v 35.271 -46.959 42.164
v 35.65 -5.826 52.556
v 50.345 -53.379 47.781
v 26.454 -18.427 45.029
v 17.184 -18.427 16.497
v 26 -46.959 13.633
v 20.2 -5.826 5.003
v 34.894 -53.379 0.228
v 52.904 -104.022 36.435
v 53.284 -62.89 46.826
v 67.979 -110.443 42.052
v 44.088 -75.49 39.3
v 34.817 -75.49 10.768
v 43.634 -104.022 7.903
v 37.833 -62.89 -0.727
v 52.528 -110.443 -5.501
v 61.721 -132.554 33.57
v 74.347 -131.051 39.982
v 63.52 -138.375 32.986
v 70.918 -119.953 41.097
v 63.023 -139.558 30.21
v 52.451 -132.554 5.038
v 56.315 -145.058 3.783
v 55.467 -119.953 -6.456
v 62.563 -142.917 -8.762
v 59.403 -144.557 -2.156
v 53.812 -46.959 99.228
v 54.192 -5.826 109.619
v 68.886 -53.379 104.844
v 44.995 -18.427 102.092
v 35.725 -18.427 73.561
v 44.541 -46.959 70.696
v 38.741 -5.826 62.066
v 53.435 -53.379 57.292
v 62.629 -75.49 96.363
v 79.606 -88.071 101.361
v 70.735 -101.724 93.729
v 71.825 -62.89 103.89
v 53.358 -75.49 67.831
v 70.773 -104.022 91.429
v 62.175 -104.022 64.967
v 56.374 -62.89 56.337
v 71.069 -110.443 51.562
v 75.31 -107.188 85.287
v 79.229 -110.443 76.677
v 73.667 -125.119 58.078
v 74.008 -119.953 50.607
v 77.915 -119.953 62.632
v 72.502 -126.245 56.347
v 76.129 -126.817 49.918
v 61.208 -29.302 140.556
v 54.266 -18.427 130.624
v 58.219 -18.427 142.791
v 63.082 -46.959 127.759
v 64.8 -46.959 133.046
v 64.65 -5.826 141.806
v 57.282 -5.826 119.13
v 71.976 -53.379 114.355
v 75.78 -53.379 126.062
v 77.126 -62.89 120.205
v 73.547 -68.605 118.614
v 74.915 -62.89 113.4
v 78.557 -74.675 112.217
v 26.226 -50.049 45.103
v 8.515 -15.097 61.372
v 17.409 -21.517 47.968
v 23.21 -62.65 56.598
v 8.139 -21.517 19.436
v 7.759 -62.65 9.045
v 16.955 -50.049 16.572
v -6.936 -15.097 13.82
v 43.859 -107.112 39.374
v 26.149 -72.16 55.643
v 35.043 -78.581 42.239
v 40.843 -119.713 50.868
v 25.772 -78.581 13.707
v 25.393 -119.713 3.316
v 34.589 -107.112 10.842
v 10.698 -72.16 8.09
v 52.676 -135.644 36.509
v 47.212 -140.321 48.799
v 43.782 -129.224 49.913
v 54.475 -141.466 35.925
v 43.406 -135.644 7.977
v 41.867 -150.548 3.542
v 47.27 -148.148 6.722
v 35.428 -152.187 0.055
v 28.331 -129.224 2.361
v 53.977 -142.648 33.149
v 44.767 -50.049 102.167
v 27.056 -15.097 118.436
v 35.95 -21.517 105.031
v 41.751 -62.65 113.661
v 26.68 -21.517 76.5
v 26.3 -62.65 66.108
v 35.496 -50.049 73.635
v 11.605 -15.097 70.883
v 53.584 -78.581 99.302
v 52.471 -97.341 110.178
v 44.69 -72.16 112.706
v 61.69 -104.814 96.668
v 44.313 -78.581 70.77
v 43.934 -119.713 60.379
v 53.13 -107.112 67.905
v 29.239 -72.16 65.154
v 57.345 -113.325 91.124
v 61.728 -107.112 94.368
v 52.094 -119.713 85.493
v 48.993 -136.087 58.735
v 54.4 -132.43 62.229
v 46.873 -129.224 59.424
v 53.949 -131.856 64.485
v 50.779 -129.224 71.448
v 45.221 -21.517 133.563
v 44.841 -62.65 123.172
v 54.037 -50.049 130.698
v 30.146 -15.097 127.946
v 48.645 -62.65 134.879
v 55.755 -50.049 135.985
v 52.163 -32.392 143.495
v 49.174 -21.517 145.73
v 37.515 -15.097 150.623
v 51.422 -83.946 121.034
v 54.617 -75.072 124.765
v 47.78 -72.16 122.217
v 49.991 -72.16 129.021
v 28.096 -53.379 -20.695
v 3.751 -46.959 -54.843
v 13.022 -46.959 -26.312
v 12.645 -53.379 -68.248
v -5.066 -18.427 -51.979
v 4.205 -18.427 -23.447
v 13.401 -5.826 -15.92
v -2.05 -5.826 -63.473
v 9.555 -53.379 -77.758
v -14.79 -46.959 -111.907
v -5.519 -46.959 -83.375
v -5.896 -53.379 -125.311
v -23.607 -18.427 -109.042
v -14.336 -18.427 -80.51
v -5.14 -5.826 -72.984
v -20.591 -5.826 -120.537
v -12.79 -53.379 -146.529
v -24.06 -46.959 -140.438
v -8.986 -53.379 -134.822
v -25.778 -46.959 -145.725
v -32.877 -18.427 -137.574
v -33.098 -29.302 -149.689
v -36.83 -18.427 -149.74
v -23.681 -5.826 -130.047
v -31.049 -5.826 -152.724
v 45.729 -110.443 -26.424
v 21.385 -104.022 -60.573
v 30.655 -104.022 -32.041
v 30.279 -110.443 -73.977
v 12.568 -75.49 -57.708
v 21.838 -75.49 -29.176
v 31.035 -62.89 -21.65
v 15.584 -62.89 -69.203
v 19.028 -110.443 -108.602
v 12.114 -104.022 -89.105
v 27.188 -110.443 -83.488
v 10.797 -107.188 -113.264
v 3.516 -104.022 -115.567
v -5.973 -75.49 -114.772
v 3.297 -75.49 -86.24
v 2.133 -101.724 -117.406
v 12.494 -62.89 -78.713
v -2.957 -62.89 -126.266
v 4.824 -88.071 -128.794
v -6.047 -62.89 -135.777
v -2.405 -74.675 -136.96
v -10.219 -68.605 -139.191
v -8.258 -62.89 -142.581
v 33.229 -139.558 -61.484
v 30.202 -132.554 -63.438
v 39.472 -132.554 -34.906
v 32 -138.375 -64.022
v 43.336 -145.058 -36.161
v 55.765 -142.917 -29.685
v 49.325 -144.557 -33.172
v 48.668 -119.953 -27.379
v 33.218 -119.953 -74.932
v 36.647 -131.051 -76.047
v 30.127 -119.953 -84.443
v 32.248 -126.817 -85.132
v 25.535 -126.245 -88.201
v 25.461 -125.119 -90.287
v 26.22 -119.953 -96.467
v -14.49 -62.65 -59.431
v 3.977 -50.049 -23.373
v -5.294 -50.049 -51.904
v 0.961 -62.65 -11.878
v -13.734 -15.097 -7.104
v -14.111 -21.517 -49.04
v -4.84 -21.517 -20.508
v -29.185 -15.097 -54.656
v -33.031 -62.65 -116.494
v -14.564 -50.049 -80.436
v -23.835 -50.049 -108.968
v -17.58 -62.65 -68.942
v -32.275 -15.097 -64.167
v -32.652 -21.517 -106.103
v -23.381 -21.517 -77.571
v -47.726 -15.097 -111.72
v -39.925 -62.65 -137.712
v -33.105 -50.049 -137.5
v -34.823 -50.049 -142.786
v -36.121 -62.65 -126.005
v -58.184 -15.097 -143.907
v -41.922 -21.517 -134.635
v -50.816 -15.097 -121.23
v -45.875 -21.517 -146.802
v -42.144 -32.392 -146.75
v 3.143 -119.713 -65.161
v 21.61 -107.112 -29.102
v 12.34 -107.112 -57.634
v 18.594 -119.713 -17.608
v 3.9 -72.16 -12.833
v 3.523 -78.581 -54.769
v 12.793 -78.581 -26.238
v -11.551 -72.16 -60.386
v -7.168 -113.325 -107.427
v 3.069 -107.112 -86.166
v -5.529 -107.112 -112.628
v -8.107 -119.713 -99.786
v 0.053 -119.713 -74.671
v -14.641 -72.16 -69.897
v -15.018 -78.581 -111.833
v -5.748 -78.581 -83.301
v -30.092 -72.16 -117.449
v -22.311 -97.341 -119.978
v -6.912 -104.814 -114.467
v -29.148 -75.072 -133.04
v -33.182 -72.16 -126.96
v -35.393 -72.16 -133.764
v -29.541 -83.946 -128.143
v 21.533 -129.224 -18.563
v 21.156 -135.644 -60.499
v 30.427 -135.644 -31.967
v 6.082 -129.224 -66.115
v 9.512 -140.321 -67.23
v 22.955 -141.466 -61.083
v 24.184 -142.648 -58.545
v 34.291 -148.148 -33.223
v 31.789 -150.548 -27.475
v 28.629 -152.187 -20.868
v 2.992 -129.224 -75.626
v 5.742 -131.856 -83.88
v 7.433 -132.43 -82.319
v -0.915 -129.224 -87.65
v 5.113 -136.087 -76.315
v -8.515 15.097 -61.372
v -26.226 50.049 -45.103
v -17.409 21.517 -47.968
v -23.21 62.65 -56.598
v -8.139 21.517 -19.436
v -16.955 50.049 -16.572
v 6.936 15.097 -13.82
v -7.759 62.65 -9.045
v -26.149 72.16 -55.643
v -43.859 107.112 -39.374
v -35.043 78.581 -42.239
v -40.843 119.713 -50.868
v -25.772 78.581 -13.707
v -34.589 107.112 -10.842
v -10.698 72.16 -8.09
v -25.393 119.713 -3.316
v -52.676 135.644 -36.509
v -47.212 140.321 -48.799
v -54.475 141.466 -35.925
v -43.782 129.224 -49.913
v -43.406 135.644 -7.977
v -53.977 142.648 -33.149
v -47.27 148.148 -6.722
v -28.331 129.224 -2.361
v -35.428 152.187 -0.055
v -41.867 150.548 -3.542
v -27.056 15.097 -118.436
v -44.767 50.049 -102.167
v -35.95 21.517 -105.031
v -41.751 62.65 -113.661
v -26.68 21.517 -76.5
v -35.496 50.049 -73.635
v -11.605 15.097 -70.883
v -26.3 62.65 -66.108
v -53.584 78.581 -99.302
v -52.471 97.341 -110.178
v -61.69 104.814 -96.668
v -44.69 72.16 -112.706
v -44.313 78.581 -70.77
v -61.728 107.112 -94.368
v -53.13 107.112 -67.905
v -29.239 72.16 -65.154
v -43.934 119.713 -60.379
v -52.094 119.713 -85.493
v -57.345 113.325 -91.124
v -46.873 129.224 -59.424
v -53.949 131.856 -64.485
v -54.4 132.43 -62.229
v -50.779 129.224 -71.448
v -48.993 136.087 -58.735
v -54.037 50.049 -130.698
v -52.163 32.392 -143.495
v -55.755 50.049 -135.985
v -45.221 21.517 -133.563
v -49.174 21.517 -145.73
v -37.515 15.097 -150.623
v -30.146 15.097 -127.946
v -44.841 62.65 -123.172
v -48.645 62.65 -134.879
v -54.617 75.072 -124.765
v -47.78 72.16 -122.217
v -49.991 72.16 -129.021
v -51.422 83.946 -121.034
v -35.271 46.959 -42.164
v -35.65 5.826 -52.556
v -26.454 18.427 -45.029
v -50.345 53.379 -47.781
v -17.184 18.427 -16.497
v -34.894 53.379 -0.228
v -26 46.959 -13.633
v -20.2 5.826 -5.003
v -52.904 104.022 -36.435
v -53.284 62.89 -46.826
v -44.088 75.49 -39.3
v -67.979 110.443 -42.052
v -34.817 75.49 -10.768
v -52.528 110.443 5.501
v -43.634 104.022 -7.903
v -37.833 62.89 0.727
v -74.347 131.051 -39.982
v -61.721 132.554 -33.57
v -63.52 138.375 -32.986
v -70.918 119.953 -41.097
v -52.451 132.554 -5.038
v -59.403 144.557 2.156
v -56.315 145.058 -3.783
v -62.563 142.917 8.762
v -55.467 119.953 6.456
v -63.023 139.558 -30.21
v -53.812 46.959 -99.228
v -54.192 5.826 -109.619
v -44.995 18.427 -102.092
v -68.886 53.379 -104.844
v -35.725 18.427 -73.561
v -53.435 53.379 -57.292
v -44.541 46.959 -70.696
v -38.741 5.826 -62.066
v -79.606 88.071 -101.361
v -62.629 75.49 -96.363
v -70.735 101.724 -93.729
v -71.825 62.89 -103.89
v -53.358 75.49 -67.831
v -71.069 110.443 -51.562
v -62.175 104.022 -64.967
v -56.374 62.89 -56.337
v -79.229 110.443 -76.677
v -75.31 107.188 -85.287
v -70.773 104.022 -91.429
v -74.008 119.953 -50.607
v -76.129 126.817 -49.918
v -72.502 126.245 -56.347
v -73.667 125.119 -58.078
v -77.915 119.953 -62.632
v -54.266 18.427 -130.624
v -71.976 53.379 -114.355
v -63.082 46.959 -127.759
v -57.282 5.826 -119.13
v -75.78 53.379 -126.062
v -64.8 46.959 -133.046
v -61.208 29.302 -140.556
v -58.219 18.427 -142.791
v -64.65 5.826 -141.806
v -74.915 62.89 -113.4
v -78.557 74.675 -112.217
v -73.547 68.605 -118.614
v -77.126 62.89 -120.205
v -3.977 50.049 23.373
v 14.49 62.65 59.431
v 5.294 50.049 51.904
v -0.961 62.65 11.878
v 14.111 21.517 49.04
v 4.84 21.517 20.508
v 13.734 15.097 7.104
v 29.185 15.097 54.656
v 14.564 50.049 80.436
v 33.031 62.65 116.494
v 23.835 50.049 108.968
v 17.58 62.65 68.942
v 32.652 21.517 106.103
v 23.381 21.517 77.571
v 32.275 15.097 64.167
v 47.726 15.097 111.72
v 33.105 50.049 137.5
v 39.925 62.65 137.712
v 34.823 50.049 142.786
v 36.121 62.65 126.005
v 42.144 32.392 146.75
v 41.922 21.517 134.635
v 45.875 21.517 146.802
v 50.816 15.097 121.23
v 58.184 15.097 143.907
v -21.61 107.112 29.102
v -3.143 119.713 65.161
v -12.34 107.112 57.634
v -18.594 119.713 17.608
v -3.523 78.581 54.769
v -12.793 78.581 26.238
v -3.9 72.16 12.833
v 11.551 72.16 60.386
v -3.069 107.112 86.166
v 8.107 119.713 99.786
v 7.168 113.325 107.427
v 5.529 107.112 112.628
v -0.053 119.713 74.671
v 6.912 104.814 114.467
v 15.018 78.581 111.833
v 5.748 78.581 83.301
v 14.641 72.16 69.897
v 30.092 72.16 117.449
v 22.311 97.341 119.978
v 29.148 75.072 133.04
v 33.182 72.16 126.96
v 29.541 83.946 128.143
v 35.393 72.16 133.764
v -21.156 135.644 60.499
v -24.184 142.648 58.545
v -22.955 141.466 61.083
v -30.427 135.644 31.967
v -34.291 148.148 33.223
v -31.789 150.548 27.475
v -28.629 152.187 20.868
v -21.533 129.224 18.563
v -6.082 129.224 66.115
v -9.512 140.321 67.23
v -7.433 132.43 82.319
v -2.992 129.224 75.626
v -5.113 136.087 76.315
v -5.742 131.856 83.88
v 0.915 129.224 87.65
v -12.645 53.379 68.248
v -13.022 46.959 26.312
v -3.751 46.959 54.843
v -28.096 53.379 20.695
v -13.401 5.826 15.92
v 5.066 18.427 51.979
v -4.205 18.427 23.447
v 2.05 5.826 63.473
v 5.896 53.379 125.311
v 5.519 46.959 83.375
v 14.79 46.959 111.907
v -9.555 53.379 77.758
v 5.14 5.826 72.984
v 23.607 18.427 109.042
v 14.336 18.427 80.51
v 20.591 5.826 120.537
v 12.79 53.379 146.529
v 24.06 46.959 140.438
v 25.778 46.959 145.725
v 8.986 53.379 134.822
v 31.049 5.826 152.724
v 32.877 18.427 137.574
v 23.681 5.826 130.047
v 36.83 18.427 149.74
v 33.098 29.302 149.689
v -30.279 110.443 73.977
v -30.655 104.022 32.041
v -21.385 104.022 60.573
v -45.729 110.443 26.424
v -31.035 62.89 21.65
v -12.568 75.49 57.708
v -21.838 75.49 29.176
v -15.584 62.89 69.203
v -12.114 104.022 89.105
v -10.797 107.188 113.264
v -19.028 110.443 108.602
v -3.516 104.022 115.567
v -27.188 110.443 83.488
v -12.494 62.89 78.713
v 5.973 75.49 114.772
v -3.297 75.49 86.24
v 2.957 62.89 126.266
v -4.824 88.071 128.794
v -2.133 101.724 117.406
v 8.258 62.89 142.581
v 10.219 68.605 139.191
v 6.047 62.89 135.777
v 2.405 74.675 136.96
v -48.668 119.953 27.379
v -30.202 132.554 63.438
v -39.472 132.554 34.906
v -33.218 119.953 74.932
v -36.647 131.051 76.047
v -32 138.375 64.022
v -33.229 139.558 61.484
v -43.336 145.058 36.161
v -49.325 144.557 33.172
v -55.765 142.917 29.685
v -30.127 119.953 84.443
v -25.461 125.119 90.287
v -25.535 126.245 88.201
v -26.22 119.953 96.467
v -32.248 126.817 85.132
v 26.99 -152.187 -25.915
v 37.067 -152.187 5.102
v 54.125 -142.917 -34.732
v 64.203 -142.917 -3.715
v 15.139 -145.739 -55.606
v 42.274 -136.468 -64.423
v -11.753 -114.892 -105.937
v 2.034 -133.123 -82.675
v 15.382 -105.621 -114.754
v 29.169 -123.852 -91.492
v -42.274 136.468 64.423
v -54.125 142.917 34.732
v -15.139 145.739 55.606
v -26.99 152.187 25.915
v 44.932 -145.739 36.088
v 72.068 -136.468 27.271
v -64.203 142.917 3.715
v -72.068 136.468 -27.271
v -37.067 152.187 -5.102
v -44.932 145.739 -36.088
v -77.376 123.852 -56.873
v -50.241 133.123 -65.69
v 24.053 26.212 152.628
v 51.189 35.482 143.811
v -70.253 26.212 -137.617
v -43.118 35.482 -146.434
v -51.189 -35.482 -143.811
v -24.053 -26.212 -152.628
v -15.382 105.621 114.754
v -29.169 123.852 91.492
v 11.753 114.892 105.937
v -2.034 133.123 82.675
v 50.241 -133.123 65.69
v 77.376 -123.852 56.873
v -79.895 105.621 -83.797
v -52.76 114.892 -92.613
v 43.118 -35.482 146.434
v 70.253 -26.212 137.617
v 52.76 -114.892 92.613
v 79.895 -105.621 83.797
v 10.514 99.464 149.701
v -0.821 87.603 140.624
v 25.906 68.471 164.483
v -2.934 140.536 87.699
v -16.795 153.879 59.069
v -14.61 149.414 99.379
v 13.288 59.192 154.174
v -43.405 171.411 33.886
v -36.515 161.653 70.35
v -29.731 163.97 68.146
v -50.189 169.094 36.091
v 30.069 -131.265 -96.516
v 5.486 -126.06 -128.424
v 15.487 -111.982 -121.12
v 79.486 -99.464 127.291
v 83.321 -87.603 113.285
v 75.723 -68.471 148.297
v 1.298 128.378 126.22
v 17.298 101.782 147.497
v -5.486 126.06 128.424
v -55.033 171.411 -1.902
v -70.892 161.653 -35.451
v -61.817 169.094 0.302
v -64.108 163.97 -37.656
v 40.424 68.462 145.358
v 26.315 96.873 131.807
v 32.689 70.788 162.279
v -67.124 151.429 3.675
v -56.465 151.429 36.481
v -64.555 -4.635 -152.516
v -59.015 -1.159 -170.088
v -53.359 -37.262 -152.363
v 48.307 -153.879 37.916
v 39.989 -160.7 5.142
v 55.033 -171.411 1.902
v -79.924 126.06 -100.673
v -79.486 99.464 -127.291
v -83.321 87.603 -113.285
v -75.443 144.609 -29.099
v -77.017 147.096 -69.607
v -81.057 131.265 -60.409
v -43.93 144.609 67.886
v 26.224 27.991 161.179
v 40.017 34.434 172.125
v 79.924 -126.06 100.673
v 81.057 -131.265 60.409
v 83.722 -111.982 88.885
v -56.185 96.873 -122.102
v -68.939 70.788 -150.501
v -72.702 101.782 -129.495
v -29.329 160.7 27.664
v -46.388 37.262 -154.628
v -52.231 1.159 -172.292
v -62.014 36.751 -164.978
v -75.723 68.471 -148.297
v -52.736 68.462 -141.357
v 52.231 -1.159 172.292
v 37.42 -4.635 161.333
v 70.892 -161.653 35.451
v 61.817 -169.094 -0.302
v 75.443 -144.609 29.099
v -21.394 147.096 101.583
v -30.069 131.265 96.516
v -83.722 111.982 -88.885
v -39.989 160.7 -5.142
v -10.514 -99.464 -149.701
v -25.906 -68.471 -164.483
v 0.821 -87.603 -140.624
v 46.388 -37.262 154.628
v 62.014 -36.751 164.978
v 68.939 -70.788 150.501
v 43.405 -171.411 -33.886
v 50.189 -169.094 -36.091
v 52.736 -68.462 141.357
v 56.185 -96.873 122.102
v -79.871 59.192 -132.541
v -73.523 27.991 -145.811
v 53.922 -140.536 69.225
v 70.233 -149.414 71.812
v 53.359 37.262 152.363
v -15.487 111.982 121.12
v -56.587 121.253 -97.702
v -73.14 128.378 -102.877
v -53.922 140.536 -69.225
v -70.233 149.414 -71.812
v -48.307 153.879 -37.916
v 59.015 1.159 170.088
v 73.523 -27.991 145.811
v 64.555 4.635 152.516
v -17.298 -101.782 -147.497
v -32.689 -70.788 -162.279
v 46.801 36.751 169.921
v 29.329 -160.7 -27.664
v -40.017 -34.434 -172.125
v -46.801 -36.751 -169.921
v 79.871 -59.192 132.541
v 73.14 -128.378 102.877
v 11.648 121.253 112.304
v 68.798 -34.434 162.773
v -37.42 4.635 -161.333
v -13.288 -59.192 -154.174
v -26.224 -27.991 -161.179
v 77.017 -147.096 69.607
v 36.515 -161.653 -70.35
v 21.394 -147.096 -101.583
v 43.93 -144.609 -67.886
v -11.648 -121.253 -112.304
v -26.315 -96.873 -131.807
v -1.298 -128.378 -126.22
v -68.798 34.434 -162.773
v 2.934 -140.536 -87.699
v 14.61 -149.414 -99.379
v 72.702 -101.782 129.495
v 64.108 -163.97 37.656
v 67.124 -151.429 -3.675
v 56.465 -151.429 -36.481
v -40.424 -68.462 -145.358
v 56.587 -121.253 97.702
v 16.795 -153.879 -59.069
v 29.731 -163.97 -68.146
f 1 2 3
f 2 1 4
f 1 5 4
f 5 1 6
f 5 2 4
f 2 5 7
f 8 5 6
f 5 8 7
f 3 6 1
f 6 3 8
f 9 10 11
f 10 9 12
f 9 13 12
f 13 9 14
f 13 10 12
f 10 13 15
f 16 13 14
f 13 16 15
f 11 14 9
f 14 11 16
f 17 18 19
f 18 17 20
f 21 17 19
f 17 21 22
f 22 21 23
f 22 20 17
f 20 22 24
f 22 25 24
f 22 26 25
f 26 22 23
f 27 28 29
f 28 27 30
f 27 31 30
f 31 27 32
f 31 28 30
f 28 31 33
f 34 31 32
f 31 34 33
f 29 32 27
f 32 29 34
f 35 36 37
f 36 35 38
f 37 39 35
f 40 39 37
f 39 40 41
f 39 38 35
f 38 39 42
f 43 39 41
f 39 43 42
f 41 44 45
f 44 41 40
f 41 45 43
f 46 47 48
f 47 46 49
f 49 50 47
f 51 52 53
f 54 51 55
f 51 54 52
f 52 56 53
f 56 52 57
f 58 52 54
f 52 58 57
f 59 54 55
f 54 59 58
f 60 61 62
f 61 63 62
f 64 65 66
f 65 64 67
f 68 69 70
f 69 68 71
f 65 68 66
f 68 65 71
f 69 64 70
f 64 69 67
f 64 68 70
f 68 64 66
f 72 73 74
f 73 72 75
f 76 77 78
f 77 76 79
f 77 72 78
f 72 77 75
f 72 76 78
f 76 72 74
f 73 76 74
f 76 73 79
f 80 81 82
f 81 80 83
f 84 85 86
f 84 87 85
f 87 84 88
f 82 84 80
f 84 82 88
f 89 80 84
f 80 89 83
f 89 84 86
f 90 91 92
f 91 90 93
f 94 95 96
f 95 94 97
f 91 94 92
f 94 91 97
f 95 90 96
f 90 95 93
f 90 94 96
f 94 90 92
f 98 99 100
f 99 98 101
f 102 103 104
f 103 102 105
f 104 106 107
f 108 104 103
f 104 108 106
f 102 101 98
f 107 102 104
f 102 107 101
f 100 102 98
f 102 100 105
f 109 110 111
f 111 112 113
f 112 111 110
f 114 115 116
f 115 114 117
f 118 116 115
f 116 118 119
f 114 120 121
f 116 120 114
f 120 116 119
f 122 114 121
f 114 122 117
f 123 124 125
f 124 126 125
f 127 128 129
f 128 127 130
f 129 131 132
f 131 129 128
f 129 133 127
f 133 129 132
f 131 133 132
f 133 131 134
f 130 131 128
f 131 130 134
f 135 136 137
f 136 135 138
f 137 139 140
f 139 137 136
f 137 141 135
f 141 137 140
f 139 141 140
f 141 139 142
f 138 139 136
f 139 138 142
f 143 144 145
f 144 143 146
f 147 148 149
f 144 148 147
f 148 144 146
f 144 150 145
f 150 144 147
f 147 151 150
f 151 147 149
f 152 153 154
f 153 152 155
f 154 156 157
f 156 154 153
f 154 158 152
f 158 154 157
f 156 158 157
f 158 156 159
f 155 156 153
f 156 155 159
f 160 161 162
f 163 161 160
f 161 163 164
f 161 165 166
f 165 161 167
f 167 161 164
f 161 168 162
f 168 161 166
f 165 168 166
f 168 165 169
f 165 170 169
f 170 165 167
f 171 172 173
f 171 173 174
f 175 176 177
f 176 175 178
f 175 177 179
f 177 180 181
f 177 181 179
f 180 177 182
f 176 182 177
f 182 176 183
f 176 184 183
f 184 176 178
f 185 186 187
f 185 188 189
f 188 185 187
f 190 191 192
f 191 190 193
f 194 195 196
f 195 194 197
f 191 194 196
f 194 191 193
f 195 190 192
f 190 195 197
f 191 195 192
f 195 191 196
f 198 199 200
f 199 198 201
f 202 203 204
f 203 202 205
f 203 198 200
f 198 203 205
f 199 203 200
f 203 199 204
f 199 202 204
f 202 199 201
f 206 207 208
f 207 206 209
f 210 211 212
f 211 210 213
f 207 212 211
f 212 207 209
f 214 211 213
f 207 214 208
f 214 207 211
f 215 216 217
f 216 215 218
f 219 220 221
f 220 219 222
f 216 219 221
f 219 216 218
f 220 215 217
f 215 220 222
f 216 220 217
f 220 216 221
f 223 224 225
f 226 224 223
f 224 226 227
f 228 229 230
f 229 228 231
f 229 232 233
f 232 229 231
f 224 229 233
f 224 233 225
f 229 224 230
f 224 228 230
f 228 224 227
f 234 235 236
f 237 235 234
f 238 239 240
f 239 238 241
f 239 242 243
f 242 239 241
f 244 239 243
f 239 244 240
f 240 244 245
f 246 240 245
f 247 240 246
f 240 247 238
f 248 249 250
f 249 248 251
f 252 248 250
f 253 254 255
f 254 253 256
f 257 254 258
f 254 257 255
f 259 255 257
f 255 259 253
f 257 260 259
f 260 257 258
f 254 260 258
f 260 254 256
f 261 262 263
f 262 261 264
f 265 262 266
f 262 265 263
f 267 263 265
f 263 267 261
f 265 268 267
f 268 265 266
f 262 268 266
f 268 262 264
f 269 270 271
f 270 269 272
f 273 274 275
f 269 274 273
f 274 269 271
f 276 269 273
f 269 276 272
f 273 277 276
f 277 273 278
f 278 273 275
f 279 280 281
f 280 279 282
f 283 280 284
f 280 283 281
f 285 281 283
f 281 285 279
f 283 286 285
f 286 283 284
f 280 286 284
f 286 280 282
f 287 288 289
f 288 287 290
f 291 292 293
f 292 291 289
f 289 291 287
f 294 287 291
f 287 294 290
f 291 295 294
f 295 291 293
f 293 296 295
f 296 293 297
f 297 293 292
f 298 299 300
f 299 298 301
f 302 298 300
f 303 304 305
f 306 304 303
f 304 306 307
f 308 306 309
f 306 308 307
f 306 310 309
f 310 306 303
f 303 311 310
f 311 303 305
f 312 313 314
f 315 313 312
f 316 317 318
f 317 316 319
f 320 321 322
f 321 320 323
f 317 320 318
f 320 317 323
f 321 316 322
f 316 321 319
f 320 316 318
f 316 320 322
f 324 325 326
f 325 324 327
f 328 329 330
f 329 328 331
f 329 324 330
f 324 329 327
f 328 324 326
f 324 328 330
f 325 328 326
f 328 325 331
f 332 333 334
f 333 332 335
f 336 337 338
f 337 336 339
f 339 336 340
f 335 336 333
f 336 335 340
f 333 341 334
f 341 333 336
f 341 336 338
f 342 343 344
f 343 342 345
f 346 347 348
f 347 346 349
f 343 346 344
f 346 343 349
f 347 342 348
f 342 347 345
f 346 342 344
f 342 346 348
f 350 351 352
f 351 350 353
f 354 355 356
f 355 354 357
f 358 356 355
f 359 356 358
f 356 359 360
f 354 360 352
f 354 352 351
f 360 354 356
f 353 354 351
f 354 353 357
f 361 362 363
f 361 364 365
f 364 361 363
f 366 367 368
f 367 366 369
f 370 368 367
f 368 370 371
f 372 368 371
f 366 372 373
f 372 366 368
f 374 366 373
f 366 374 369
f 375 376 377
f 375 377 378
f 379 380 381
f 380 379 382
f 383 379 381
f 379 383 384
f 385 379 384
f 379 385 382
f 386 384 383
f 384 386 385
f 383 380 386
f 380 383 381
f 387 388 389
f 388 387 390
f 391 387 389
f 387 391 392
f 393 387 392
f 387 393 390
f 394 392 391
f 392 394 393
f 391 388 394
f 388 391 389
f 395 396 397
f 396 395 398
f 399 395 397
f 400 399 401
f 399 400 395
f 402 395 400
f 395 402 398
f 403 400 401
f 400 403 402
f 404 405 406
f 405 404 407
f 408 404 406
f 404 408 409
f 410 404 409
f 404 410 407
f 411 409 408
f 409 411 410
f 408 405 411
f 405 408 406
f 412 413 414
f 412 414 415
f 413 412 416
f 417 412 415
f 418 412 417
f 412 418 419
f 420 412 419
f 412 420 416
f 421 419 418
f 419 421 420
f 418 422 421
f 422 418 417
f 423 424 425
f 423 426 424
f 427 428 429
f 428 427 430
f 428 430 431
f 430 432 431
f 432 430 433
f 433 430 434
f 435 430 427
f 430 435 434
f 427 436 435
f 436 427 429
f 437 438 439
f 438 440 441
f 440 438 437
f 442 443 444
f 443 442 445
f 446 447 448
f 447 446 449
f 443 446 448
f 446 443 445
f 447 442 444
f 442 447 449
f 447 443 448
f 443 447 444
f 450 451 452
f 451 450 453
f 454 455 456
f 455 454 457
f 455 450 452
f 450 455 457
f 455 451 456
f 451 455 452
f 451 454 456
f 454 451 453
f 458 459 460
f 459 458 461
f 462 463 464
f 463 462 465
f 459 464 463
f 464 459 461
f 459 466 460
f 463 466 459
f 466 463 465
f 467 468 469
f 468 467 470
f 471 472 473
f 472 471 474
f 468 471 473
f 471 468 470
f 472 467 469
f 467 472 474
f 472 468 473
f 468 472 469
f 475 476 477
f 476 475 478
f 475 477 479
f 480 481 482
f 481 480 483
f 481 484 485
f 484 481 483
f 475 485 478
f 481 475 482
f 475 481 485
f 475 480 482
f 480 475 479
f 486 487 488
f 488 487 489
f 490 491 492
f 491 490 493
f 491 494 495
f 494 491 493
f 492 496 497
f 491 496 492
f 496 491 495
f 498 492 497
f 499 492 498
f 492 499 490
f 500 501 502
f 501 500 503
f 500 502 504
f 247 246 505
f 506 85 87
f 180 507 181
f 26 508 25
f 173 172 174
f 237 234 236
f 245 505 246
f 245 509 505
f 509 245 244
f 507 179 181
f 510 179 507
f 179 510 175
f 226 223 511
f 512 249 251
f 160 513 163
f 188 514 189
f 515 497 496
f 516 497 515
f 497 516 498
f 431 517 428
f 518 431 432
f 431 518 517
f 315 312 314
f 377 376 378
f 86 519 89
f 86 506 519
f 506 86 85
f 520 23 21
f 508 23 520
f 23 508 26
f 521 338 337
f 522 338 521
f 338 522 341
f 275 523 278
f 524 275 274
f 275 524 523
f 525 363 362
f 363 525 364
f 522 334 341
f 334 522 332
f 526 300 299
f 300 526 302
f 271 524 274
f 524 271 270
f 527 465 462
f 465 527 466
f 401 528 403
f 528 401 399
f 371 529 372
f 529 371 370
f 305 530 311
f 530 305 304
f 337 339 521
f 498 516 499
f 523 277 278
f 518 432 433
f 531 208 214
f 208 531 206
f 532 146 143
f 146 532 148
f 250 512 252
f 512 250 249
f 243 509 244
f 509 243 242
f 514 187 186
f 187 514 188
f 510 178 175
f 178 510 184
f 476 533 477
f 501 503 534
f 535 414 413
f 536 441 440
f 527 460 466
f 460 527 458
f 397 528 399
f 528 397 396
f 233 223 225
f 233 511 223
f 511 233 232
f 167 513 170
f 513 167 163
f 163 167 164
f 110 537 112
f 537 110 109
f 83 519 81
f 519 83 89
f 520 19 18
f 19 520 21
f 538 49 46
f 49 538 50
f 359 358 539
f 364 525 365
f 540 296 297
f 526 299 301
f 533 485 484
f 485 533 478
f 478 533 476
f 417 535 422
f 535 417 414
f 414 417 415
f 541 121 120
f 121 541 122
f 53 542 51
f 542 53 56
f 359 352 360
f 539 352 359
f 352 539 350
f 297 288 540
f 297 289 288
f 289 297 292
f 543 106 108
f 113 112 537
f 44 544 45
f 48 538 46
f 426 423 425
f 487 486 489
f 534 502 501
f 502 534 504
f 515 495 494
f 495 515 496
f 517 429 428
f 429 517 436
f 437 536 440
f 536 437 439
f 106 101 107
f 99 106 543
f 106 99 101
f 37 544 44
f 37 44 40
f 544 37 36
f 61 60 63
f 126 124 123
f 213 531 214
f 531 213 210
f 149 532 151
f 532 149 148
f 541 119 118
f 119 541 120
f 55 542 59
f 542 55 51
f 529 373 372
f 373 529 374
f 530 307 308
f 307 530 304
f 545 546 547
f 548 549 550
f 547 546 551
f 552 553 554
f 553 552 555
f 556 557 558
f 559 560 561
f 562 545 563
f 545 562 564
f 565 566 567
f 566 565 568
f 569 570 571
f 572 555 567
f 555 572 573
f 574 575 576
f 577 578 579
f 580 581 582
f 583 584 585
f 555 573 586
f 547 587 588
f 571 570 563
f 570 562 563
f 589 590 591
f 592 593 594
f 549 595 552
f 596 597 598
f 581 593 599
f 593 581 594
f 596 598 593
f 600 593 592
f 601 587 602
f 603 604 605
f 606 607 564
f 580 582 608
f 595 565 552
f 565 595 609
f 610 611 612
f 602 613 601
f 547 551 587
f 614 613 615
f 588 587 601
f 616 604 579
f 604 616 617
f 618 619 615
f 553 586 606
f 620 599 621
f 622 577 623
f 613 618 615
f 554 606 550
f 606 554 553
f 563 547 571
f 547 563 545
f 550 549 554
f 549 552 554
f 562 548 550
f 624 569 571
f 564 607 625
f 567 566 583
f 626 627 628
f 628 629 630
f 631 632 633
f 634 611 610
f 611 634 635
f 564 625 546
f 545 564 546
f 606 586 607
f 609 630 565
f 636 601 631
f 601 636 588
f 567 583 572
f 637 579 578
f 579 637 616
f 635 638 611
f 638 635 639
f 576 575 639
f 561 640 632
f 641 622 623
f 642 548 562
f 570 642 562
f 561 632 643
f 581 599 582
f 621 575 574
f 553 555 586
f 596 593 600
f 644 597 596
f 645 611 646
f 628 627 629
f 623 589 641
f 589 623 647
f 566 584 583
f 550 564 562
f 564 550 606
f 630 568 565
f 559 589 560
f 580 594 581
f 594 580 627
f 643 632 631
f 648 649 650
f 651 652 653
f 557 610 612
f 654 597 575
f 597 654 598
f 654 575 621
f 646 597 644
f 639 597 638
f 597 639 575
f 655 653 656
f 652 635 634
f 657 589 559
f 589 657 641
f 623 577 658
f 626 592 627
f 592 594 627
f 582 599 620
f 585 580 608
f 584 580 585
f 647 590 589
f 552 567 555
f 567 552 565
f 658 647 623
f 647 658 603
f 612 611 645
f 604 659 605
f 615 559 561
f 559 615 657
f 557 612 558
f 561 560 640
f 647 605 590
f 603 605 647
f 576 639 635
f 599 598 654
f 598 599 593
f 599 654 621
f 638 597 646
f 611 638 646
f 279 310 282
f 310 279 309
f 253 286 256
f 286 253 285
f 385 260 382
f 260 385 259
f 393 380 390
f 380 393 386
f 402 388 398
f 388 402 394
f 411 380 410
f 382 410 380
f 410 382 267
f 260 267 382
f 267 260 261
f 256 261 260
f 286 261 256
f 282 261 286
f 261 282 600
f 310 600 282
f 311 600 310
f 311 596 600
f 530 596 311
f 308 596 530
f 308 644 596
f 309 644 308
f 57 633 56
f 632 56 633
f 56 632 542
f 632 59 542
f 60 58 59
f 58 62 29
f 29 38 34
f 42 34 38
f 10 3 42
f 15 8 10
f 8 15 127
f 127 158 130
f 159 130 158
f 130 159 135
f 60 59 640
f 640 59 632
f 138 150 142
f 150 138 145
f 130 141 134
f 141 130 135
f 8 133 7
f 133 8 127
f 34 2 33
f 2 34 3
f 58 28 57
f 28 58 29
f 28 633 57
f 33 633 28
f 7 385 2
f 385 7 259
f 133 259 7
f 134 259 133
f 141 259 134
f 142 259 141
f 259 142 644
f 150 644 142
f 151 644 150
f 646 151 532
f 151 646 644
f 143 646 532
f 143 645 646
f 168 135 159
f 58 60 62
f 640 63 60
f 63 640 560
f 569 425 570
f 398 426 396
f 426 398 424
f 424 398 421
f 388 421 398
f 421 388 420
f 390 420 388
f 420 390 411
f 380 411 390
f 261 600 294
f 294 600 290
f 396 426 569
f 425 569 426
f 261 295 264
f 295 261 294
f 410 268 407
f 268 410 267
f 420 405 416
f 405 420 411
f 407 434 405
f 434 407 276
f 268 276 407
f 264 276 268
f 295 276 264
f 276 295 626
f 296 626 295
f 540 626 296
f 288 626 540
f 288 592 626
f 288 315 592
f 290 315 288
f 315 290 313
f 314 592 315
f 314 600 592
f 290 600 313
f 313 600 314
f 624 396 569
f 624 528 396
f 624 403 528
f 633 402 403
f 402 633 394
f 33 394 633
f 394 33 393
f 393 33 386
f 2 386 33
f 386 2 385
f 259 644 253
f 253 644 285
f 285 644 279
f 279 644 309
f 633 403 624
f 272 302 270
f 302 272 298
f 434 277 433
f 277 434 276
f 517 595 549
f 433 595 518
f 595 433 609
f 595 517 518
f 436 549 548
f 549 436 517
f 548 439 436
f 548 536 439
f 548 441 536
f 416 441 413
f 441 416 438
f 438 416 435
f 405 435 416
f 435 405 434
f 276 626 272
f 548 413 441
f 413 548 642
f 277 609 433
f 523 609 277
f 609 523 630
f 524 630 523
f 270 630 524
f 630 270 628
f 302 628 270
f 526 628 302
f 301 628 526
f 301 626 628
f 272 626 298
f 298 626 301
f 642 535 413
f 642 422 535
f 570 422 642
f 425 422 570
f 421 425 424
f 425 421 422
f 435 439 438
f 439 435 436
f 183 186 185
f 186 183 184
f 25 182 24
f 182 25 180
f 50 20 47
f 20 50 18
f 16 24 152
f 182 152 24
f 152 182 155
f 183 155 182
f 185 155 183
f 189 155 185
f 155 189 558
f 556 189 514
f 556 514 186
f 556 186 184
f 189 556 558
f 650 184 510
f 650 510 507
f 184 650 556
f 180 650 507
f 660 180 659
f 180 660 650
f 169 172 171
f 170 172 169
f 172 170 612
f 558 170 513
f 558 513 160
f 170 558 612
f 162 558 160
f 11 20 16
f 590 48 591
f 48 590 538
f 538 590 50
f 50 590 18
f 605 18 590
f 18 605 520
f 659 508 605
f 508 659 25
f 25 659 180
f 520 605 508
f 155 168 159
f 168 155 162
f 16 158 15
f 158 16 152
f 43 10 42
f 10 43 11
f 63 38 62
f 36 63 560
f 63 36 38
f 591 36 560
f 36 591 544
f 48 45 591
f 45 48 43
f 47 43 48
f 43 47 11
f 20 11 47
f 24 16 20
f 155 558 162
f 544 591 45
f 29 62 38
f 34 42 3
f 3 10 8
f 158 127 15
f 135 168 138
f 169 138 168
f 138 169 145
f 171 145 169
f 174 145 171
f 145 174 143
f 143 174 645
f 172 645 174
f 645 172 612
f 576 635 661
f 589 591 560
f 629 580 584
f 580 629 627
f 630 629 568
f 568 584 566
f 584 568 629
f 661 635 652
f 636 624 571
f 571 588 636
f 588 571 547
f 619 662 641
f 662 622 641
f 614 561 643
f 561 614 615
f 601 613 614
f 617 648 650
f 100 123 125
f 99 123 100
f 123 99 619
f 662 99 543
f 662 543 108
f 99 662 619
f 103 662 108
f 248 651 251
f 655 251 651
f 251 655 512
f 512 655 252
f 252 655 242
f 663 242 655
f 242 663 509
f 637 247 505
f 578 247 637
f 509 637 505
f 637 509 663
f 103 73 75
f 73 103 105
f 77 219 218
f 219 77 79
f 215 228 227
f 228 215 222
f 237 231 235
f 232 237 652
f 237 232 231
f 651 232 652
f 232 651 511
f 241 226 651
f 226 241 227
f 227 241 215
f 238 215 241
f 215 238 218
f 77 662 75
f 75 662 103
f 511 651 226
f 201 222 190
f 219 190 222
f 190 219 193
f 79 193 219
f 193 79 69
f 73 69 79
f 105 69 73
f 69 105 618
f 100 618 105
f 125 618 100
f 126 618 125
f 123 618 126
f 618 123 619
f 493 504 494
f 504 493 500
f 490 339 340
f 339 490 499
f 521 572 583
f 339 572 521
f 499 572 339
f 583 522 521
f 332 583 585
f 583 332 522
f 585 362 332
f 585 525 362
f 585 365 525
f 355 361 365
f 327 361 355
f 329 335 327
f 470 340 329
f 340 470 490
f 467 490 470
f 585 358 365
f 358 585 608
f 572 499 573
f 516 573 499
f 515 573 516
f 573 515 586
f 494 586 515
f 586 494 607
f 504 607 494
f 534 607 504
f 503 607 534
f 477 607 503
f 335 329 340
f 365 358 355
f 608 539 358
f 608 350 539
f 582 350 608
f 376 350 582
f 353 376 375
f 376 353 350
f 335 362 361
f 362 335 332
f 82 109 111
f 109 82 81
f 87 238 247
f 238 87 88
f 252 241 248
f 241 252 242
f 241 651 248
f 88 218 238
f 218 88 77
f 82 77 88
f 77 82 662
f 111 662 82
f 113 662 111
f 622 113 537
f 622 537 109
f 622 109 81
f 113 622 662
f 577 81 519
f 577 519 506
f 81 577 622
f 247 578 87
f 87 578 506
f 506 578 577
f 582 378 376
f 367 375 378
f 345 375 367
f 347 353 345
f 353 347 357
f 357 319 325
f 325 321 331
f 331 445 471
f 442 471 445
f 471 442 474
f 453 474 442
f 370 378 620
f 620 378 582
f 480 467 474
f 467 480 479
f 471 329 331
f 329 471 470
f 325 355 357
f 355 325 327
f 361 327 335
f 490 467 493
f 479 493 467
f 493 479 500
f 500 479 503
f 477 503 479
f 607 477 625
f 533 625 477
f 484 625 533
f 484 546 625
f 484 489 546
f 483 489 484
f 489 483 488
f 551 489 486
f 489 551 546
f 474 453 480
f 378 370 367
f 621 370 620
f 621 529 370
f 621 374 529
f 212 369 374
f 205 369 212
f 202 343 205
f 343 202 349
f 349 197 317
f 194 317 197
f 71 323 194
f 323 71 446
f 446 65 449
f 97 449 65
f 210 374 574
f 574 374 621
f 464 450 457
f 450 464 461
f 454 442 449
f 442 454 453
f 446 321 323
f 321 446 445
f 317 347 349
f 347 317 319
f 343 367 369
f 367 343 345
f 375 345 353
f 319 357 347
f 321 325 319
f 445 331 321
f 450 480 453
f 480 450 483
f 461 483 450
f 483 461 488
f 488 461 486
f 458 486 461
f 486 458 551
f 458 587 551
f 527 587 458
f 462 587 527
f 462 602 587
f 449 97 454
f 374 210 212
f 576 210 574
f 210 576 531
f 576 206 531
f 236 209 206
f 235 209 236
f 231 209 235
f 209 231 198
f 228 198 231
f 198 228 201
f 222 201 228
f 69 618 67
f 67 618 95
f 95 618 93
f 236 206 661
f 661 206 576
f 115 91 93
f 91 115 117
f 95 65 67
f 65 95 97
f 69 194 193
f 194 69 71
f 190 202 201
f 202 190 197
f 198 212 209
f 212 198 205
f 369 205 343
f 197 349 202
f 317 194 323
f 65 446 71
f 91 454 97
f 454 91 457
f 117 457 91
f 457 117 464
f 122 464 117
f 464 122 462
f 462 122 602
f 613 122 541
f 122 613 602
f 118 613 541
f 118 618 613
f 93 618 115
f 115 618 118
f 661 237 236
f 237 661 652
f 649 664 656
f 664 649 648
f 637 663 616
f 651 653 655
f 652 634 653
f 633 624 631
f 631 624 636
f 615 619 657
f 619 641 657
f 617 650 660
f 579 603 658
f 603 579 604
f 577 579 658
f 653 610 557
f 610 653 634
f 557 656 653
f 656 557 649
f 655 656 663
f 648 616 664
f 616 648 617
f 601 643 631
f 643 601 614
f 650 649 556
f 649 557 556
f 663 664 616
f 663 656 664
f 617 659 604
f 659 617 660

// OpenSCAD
// Trying to draw a 3D waffle to be used as a logo for the program ;-)
// Author: Felipe Correa da Silva Sanches <juca@members.fsf.org>
// License: Affero GPLv3 or later.

L = 30;
module hole(L){
    hull(){
        cube(L, center=true);
        translate([0,0,L]) cube(2*L, center=true);
    }
}

module body(){
hull(){
    cylinder(h=L/4, r=6*L, center=true);
    cylinder(h=L, r=5.5*L, center=true);
}
}


module holes(){
    intersection(){
        hull(){
            cylinder(h=L/4+1, r=5.2*L, center=true);
            cylinder(h=L+1, r=5.2*L, center=true);
        }
        for (a=[0:3]){
            rotate(90*a){
                for (b=[0,180]){
                    for (i=[1:3]){
                        for (j=[1:3]){
                            translate([-0.8*L, -0.8*L])
                            translate([L*2*i, L*2*j])
                            rotate([0, b]){
                                translate([0, 0, 2*L/3])
                                hole(L);
                            }
                        }
                    }
                }
            }
        }
    }
}

module waffle(){
    difference(){
        body();
        holes();
    }
}

rotate([0.55*360, 0.8*360, 0])
color([0.95,0.85,0.5]) waffle();
